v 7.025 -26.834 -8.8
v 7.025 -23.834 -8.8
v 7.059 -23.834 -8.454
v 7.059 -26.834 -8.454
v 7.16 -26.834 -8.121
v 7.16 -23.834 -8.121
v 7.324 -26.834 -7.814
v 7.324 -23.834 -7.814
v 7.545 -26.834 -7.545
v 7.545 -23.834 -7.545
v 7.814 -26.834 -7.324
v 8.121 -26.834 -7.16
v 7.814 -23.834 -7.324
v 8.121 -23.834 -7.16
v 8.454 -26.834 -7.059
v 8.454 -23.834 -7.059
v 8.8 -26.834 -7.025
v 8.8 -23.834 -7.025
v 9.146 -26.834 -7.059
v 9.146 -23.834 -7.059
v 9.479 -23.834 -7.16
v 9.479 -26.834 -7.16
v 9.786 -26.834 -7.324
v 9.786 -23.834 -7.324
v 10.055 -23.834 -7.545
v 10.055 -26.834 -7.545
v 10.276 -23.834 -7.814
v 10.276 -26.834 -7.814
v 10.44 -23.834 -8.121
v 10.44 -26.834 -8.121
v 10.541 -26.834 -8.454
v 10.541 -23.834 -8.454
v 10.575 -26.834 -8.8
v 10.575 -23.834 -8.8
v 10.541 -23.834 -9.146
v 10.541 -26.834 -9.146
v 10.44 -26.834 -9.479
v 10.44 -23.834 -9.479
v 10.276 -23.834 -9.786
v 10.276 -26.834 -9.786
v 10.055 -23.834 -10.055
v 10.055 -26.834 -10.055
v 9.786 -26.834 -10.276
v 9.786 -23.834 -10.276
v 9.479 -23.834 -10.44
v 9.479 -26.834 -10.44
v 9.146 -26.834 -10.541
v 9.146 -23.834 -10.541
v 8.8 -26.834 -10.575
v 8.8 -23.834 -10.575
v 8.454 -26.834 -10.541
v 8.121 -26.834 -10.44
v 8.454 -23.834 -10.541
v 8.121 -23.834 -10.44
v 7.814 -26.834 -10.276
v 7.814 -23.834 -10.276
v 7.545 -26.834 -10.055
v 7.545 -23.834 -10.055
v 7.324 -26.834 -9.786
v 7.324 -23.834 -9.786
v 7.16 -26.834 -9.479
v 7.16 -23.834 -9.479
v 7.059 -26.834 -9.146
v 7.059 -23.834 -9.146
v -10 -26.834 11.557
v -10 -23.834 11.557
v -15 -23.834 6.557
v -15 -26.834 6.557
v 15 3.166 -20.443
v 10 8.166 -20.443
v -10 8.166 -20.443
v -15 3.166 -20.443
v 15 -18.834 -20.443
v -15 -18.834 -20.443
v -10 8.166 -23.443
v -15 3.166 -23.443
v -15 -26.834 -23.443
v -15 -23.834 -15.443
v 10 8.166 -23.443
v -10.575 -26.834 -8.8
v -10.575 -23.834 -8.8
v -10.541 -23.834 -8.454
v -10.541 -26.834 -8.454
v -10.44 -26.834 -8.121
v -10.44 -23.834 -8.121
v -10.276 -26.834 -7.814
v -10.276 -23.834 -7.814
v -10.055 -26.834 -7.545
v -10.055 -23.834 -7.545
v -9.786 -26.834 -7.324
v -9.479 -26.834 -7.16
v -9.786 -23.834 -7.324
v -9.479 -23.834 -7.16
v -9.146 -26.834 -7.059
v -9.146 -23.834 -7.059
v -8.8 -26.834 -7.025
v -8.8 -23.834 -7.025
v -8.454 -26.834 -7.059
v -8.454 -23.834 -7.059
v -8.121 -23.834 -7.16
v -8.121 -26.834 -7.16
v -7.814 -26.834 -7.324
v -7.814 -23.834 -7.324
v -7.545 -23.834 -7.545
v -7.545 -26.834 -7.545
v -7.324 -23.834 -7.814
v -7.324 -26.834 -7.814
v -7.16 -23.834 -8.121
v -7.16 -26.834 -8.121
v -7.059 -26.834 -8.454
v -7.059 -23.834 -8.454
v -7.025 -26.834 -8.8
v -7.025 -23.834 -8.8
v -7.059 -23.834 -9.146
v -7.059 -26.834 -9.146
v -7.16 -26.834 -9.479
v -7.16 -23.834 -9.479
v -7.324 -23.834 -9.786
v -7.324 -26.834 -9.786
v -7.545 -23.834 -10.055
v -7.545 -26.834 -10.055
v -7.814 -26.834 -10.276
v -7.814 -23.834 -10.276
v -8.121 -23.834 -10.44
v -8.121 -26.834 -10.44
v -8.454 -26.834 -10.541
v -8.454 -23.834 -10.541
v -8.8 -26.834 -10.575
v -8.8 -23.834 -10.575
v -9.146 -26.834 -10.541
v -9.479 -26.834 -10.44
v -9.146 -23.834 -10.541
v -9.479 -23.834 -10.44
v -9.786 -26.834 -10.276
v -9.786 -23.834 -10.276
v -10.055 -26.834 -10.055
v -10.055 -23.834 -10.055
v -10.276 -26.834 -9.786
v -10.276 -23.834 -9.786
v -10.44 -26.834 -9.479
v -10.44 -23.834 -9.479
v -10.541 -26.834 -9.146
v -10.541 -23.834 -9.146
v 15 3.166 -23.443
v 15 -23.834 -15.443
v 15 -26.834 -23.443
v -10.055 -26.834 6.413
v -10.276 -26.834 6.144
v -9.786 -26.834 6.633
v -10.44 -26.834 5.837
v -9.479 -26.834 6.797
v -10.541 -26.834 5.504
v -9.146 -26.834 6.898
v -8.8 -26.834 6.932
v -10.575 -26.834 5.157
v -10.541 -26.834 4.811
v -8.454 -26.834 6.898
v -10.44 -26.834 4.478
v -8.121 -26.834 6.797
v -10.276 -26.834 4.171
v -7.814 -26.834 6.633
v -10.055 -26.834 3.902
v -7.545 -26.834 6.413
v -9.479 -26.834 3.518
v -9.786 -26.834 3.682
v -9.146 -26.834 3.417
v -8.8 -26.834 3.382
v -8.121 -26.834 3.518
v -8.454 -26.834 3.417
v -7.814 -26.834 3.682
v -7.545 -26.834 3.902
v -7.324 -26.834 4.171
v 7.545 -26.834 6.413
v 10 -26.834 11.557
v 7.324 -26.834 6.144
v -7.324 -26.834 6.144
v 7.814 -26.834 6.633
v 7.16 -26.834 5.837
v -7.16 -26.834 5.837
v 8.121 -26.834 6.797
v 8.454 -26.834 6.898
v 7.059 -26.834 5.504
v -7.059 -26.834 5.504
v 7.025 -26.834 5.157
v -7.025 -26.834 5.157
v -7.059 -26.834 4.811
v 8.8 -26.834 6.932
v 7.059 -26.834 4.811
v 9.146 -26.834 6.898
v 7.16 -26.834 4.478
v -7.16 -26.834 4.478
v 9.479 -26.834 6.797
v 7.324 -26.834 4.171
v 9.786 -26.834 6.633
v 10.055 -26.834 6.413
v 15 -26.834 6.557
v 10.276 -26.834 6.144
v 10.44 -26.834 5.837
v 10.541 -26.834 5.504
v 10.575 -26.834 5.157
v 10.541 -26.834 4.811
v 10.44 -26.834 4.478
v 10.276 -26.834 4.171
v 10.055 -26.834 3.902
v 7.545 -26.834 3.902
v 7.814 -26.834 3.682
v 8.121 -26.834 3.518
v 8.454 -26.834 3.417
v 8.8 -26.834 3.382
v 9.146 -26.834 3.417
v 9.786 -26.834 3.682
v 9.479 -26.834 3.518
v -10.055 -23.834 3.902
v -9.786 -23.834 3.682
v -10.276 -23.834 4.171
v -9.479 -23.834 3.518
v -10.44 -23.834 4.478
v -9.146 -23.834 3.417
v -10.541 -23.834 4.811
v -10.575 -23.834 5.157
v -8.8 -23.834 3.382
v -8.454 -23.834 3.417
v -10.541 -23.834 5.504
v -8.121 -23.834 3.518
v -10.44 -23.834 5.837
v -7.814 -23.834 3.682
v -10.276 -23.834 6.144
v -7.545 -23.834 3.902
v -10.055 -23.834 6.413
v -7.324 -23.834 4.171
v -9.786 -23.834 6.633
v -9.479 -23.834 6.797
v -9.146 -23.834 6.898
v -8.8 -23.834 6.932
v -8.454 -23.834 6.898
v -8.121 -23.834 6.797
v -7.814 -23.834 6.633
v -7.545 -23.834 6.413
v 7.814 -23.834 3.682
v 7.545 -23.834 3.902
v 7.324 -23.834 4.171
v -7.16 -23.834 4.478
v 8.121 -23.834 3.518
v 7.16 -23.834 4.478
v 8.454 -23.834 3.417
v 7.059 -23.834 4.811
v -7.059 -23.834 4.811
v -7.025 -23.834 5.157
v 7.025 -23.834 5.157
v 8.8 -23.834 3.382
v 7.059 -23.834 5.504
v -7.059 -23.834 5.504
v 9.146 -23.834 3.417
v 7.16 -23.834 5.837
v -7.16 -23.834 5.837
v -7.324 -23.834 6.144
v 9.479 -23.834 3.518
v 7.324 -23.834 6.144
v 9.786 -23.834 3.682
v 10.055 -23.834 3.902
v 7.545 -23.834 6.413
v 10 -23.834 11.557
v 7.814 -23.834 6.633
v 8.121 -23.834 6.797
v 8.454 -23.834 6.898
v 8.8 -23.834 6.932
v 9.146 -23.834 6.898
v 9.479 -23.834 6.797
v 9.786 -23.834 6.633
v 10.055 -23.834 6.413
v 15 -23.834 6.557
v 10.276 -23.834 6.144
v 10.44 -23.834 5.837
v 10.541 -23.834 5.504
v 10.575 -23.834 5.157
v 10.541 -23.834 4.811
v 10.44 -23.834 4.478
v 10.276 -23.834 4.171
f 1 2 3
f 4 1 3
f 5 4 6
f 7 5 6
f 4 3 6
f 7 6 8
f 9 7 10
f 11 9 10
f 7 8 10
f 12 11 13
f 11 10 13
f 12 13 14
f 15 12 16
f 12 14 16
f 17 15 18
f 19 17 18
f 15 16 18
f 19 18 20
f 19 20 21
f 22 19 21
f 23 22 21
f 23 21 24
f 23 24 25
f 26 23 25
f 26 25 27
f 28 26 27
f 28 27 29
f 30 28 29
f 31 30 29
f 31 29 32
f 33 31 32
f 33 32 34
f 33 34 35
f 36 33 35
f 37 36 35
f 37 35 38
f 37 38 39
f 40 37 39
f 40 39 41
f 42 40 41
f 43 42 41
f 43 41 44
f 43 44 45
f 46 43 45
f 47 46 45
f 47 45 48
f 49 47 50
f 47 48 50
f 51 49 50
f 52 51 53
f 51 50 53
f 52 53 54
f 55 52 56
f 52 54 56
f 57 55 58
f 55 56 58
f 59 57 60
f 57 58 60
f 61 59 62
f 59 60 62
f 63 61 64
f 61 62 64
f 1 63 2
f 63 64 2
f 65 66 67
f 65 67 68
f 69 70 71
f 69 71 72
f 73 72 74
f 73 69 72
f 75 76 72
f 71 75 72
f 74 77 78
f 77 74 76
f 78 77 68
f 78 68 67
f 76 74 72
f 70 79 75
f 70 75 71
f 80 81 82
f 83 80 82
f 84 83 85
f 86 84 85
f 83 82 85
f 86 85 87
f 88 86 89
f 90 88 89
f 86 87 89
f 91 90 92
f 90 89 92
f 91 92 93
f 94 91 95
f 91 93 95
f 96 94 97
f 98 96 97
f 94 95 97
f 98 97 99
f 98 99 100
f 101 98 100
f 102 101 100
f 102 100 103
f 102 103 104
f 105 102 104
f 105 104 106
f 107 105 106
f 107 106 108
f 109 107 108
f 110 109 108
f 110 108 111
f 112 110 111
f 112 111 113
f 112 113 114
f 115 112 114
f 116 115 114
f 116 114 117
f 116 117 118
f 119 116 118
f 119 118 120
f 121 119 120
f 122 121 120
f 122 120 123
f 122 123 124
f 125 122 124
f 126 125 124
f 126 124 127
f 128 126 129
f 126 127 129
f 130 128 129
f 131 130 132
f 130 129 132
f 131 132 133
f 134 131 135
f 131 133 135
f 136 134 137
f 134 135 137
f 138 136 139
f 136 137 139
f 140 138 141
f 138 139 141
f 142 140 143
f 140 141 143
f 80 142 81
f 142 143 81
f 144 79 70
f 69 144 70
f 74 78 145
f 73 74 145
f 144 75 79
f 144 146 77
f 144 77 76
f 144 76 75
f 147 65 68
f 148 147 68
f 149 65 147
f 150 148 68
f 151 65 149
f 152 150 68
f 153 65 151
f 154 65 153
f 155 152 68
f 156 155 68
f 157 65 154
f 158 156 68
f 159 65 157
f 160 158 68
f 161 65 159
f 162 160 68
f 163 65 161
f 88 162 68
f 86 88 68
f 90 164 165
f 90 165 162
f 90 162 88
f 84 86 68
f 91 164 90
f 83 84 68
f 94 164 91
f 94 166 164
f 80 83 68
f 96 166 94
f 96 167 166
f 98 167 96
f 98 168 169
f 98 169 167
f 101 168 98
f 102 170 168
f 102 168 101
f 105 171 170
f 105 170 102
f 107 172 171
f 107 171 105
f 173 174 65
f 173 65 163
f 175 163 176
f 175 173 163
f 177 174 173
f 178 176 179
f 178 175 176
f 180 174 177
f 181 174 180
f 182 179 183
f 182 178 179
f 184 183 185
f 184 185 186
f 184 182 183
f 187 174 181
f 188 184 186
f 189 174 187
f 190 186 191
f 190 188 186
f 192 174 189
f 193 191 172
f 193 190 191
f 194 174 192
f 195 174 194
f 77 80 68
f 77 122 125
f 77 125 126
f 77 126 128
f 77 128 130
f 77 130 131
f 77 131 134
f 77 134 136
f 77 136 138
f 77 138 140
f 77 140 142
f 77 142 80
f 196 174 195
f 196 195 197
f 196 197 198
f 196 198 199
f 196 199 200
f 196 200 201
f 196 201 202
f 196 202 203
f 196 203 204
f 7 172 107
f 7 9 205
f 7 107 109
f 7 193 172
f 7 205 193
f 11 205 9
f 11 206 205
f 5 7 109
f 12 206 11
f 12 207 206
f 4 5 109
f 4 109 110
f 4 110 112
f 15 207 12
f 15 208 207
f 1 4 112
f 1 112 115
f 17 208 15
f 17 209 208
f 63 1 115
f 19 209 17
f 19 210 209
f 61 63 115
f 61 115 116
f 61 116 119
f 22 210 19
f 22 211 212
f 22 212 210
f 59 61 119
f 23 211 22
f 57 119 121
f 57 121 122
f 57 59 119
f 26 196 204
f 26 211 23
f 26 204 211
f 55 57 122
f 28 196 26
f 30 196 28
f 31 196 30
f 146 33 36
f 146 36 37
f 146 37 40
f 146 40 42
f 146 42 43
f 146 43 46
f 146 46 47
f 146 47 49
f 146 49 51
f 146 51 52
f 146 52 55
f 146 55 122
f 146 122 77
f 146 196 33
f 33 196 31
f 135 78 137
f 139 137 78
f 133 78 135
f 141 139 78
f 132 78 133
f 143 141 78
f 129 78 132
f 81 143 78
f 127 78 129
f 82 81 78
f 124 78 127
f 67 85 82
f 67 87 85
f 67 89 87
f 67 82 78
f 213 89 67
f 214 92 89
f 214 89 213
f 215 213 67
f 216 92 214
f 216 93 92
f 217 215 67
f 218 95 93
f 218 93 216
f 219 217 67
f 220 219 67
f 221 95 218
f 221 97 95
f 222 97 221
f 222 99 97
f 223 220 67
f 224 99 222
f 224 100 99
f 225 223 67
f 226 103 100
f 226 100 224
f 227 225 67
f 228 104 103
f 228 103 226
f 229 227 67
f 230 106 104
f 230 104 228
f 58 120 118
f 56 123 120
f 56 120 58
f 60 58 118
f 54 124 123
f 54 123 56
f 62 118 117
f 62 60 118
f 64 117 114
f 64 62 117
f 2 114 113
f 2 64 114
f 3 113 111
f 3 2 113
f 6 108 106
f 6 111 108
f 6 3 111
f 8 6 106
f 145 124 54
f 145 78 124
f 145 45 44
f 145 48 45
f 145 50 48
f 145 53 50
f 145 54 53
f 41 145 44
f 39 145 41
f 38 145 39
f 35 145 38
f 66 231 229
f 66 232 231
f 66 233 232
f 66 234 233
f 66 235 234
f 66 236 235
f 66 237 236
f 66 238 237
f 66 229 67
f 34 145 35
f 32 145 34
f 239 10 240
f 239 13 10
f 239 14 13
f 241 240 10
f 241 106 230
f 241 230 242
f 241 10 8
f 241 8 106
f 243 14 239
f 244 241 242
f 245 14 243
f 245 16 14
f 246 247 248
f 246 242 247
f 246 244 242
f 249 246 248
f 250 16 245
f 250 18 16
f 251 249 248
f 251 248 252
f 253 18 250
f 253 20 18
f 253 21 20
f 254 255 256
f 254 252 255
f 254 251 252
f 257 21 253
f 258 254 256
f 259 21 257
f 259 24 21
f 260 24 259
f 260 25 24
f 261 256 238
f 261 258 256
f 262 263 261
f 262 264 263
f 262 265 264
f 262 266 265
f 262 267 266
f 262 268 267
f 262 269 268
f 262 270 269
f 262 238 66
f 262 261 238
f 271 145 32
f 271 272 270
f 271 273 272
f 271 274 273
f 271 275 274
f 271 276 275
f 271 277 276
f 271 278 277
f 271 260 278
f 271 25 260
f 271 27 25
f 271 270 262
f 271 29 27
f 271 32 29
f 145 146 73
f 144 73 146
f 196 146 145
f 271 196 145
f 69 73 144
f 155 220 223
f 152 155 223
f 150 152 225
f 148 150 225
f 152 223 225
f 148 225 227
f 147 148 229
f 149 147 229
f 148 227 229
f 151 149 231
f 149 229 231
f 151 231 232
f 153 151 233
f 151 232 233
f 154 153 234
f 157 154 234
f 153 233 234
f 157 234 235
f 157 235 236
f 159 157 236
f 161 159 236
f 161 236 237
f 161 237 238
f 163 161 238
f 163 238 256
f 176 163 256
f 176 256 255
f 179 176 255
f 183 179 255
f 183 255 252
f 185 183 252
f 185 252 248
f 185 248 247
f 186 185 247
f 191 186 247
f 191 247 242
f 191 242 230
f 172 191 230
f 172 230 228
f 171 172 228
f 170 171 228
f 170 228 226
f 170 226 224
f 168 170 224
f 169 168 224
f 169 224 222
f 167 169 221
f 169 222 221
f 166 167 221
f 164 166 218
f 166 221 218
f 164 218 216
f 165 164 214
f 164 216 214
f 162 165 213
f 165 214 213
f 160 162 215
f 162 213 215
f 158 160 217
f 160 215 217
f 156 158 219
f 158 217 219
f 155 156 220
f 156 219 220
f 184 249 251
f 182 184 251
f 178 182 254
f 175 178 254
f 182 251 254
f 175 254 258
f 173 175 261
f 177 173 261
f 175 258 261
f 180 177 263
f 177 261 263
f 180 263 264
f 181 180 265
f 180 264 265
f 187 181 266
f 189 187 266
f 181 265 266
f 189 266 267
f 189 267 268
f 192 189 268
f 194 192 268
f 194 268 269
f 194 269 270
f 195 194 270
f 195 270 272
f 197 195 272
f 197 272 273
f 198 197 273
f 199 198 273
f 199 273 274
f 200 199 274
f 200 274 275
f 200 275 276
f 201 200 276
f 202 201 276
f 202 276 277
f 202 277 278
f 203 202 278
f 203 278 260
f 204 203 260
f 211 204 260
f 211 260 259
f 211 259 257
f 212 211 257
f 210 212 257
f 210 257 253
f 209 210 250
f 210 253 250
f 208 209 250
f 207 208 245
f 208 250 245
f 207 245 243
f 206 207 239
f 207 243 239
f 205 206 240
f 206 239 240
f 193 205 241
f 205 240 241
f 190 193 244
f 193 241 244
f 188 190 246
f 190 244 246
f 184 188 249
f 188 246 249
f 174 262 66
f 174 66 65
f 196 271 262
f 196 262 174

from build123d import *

# Parameters (mm, degrees)
F1_DEPTH      = 15
F1_DEPTH_BACK = 15
F2_R          = 1.775
F3_DEPTH      = 25
F4_W          = 5
F4_H          = 5
F5_DEPTH      = 15
F5_DEPTH_BACK = 15
F6_SIZE       = 4.99999
F7_SIZE       = 5
F8_SIZE       = 5
F9_SIZE       = 5
F10_SIZE      = 5


# Not quite as in the source:
# - a fillet or chamfer is up to 0.001 mm smaller than in the source, because OpenCascade refuses the exact size


with BuildPart() as f1:
    # F0 (on Right) → F1 (new body, two sides)
    with BuildSketch(Plane.YZ) as f1_sk:
        Polygon((-23.8343827544, 11.557416933), (-26.8343827544, 11.557416933), (-26.8343827544, -23.442583067), (8.1656172456, -23.442583067), (8.1656172456, -20.442583067), (-23.8343827544, -20.442583067), align=None)
    extrude(amount=F1_DEPTH)
    extrude(f1_sk.sketch, amount=-F1_DEPTH_BACK)

    # F2 (on face) → F3 (cut)
    with BuildSketch(Plane(origin=(0, -23.8343827544, 0), x_dir=(-1, 0, 0), z_dir=(0, 1, 0))):
        with Locations((-8.8, 5.157416933)):
            Circle(F2_R)
        with Locations((8.8, 5.157416933)):
            Circle(F2_R)
        with Locations((8.8, -8.8)):
            Circle(F2_R)
        with Locations((-8.8, -8.8)):
            Circle(F2_R)
    extrude(amount=-F3_DEPTH, mode=Mode.SUBTRACT)

    # F4 (on Right) → F5 (join, two sides)
    with BuildSketch(Plane.YZ) as f5_sk:
        with Locations((-21.3343827544, -17.942583067)):
            Rectangle(F4_W, F4_H)
    extrude(amount=F5_DEPTH)
    extrude(f5_sk.sketch, amount=-F5_DEPTH_BACK)

    # F6 (size 5 in the source; OpenCascade refuses exactly that, so slightly less here)
    f6_edges = [f1.edges().sort_by_distance(p)[0] for p in [
        (0, -18.834383, -15.442583),
    ]]
    chamfer(f6_edges, length=F6_SIZE)

    # F7
    f7_edges = [f1.edges().sort_by_distance(p)[0] for p in [
        (-15, -25.334383, 11.557417),
    ]]
    chamfer(f7_edges, length=F7_SIZE)

    # F8
    f8_edges = [f1.edges().sort_by_distance(p)[0] for p in [
        (15, -25.334383, 11.557417),
    ]]
    chamfer(f8_edges, length=F8_SIZE)

    # F9
    f9_edges = [f1.edges().sort_by_distance(p)[0] for p in [
        (15, 8.165617, -21.942583),
    ]]
    chamfer(f9_edges, length=F9_SIZE)

    # F10
    f10_edges = [f1.edges().sort_by_distance(p)[0] for p in [
        (-15, 8.165617, -21.942583),
    ]]
    chamfer(f10_edges, length=F10_SIZE)


solid = f1.part
